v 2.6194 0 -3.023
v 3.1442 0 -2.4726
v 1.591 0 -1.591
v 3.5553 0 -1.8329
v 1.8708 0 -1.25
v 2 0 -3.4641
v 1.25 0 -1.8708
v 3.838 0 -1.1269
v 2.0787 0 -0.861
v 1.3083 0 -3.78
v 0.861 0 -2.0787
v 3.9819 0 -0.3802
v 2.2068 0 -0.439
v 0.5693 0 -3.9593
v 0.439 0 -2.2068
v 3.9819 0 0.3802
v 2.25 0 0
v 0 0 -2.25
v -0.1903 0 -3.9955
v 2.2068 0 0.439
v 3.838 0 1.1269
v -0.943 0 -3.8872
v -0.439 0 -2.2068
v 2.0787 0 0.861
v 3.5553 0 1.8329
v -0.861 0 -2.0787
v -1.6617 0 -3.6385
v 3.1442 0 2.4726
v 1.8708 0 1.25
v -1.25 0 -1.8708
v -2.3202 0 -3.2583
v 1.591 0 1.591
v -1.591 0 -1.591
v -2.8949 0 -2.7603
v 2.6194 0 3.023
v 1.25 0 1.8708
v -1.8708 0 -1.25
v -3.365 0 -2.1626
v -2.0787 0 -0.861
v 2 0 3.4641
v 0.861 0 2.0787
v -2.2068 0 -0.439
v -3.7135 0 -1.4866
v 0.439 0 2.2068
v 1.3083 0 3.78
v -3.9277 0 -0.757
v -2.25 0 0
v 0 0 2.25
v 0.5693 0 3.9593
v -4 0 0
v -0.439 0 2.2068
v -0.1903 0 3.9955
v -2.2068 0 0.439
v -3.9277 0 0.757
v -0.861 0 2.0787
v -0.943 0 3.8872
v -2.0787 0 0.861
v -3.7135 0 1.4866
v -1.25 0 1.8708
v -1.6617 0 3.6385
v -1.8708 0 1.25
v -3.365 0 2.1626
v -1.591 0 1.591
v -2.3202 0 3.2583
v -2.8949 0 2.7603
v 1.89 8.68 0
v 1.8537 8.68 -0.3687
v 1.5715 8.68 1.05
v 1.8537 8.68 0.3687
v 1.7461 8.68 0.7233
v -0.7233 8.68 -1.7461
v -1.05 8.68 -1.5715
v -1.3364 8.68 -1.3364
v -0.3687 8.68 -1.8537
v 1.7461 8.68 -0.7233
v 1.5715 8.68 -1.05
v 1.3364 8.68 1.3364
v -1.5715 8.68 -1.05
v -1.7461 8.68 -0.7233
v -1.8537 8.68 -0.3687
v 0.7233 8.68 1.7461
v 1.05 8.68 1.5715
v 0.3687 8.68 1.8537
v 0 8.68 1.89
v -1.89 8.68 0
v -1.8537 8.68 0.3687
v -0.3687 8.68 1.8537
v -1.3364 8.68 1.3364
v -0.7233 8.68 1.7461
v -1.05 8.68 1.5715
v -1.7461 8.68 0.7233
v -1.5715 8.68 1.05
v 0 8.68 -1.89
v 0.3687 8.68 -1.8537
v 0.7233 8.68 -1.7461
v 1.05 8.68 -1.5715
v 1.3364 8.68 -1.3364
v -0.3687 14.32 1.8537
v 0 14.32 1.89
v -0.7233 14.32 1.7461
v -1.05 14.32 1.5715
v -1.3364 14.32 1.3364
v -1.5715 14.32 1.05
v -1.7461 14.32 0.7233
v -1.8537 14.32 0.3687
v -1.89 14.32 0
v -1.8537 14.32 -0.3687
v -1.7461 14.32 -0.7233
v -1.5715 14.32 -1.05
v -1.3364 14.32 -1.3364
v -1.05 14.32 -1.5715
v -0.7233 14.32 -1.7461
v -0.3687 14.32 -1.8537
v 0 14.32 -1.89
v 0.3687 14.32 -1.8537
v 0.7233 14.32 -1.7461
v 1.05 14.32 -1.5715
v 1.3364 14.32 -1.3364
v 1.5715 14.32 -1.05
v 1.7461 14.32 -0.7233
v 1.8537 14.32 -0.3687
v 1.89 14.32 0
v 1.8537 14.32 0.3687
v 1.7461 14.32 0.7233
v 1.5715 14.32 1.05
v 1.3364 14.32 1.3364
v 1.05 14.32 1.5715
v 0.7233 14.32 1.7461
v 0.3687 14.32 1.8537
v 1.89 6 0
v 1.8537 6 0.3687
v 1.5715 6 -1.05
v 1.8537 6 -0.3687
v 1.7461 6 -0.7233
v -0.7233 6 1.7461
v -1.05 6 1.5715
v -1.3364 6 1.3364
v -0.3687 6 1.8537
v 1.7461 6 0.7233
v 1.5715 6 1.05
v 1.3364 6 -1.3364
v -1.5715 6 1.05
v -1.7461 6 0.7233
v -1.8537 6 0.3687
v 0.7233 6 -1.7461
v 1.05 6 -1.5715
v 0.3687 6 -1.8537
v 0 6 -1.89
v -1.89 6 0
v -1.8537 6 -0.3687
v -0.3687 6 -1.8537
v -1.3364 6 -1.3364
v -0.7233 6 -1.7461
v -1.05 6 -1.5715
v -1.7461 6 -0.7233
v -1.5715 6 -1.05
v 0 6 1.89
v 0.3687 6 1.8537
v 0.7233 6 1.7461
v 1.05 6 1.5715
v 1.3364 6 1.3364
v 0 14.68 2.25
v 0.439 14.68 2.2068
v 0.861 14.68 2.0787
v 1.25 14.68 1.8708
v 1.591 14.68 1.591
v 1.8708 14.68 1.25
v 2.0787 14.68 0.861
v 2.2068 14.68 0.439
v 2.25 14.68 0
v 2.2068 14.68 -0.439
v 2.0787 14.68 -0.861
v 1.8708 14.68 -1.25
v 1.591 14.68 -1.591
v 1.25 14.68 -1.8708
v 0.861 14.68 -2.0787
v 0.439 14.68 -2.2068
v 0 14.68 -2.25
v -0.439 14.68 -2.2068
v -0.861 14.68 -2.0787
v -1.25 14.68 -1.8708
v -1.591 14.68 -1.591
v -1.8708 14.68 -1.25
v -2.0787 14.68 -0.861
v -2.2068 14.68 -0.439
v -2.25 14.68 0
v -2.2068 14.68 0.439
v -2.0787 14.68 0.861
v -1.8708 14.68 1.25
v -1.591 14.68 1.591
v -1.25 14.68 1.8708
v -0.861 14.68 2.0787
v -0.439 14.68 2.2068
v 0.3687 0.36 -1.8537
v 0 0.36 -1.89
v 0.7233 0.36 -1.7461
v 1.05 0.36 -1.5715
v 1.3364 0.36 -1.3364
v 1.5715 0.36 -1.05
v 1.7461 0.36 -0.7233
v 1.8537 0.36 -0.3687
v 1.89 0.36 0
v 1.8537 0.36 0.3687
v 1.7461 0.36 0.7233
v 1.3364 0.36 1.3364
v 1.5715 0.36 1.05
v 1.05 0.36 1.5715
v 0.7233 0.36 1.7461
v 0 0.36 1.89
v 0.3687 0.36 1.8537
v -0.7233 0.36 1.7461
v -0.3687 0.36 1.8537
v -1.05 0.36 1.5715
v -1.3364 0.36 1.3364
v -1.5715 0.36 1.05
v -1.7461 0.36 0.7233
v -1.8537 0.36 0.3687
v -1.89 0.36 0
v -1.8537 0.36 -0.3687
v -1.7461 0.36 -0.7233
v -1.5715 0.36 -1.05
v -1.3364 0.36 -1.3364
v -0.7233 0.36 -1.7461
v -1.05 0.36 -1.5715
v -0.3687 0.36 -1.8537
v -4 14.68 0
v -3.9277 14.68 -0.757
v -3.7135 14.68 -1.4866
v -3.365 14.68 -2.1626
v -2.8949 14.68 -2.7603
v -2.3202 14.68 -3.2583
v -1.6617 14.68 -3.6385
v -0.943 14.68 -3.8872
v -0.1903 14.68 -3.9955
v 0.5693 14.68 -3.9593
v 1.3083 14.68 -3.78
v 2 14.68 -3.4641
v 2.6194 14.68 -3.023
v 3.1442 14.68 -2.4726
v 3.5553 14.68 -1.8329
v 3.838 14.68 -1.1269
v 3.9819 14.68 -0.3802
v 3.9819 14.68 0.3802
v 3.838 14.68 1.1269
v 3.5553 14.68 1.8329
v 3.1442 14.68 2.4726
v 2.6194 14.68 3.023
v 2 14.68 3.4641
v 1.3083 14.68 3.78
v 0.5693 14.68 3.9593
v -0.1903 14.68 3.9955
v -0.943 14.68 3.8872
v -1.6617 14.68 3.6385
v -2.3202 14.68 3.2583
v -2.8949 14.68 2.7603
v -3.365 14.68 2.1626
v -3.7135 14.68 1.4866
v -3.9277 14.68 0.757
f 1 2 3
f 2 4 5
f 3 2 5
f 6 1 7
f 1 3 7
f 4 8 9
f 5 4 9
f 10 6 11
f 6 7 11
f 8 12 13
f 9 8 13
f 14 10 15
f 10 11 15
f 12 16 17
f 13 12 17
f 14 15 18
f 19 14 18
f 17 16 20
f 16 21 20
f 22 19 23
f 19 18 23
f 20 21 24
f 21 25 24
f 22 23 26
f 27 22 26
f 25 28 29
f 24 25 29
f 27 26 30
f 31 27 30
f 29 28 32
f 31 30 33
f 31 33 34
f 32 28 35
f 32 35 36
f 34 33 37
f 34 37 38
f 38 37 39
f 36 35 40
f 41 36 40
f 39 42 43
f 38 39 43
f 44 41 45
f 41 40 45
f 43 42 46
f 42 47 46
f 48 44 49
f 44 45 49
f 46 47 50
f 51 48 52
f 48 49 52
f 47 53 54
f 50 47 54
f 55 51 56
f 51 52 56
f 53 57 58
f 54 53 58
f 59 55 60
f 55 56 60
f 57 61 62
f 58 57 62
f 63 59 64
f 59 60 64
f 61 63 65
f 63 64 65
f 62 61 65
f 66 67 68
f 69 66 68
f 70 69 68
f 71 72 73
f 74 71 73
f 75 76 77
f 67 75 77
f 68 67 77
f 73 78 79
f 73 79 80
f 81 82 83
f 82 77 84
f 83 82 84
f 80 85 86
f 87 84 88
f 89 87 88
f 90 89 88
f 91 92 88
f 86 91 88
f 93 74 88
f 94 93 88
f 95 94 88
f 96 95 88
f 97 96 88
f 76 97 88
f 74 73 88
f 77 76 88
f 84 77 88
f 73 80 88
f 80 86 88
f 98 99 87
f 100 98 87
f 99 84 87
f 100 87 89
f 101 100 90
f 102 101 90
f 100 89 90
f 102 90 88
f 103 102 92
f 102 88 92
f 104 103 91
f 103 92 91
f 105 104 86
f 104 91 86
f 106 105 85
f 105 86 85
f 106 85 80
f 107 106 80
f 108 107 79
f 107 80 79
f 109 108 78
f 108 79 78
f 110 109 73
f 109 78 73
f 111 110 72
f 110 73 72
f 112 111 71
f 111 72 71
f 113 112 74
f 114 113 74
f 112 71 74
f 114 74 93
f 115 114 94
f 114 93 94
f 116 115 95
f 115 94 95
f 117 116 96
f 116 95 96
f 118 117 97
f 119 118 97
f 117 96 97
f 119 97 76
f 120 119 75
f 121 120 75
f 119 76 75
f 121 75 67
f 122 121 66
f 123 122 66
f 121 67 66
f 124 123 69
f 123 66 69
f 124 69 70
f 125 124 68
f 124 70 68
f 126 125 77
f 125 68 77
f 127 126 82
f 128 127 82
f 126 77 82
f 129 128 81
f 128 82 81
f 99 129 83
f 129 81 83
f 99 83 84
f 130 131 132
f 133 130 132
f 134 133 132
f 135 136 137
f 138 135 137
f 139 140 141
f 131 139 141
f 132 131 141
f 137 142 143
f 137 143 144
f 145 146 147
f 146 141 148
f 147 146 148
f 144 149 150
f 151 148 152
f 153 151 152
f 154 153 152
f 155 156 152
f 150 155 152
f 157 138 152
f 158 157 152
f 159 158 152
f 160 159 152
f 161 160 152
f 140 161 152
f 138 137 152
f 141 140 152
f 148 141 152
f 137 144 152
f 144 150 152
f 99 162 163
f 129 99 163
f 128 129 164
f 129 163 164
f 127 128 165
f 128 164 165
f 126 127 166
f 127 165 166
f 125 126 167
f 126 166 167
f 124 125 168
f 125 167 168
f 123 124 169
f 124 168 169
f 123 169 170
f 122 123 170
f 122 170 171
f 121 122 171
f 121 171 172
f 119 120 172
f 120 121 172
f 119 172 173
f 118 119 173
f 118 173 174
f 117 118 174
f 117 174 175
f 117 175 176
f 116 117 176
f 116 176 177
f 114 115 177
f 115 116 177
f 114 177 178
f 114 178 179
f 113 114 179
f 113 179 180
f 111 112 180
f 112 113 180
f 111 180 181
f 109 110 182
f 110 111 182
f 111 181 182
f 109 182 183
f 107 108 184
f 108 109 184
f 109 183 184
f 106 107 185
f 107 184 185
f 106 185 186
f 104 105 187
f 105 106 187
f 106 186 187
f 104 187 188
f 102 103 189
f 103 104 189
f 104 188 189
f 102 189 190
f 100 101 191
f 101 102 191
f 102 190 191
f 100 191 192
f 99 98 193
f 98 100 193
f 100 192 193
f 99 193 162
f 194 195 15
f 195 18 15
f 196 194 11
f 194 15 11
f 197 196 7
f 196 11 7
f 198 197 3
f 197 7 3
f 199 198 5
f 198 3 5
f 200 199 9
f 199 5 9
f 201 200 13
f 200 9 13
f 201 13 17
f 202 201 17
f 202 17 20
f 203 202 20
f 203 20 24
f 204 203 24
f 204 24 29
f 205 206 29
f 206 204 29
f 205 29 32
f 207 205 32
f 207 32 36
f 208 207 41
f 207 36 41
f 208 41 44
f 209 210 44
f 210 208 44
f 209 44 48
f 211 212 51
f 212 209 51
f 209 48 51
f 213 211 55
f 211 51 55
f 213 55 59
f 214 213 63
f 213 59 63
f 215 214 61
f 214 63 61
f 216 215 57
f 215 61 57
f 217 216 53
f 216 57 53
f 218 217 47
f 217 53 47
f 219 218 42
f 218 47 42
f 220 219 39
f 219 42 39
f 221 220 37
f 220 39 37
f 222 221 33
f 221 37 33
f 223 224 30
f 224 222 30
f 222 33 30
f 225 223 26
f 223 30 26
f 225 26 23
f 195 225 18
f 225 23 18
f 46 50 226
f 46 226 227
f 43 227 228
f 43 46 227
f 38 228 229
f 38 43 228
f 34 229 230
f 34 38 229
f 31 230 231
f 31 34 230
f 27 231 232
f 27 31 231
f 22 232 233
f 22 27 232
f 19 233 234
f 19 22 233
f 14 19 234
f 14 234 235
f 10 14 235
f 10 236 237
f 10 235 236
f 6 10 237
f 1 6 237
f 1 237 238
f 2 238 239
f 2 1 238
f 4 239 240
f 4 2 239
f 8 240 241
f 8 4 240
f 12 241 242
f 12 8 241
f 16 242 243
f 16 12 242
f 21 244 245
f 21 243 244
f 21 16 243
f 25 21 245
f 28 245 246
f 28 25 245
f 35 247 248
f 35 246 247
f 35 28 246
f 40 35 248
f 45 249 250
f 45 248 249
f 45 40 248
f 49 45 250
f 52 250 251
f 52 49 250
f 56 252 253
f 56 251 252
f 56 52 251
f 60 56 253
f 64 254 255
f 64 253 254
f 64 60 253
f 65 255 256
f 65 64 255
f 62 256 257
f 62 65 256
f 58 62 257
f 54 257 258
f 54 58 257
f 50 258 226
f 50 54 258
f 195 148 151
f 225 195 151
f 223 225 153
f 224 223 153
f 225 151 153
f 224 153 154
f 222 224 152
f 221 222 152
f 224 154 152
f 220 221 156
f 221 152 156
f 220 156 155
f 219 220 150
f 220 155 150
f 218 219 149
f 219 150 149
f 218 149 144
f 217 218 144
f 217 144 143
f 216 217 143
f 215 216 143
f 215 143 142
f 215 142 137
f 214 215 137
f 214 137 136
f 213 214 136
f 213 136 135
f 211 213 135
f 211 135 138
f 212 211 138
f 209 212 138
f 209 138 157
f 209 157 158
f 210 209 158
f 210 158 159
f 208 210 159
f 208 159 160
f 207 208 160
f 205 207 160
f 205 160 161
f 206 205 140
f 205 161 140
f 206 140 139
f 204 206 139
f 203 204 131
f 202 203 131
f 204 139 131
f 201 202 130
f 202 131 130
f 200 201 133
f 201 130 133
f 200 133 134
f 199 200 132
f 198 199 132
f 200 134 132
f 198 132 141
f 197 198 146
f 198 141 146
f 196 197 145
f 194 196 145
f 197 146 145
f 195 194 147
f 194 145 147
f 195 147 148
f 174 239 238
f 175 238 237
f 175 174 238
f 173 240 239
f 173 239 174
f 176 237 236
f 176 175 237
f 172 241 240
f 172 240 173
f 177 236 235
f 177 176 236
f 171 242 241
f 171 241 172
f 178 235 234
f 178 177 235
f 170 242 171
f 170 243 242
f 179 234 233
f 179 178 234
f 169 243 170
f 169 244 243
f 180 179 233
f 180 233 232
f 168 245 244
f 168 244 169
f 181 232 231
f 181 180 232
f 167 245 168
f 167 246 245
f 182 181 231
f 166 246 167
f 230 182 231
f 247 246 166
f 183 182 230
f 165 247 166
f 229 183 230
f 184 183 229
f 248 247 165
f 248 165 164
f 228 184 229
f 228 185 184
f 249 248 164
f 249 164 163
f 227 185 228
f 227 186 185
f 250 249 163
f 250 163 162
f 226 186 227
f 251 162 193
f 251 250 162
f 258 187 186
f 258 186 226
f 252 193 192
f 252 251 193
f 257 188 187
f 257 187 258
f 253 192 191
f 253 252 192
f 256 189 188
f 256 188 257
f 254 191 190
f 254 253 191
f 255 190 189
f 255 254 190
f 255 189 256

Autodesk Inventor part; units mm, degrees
ref_plane "YZ Plane" through (0, 0, 0) normal (1, 0, 0) x (0, 1, 0)
ref_plane "XZ Plane" through (0, 0, 0) normal (0, 1, 0) x (-1, 0, 0)
ref_plane "XY Plane" through (0, 0, 0) normal (0, 0, 1) x (1, 0, 0)
sketch "Sketch1" plane through (0, 0, 0) normal (0, 1, 0) x (-1, 0, 0)
  circle A0 centre (0, 0) radius 4
  dimension "d0" = 8
extrude "Extrusion1" add sketch "Sketch1" along normal blind 14.68
sketch "Sketch2" plane through (0, 14.68, 0) normal (0, 1, 0) x (1, 0, 0)
  point P0 (0, 0)
sketch "Sketch3" plane through (0, 0, 0) normal (0, -1, 0) x (1, 0, 0)
  point P0 (0, 0)
hole "Hole1" at (0, 0, 0) direction (0, 1, 0) diameter 3.78 depth 6 countersink diameter 4.5 countersink angle 90
hole "Hole2" at (0, 14.68, 0) direction (0, -1, 0) diameter 3.78 depth 6 countersink diameter 4.5 countersink angle 90
properties part number "Button Spacer"
